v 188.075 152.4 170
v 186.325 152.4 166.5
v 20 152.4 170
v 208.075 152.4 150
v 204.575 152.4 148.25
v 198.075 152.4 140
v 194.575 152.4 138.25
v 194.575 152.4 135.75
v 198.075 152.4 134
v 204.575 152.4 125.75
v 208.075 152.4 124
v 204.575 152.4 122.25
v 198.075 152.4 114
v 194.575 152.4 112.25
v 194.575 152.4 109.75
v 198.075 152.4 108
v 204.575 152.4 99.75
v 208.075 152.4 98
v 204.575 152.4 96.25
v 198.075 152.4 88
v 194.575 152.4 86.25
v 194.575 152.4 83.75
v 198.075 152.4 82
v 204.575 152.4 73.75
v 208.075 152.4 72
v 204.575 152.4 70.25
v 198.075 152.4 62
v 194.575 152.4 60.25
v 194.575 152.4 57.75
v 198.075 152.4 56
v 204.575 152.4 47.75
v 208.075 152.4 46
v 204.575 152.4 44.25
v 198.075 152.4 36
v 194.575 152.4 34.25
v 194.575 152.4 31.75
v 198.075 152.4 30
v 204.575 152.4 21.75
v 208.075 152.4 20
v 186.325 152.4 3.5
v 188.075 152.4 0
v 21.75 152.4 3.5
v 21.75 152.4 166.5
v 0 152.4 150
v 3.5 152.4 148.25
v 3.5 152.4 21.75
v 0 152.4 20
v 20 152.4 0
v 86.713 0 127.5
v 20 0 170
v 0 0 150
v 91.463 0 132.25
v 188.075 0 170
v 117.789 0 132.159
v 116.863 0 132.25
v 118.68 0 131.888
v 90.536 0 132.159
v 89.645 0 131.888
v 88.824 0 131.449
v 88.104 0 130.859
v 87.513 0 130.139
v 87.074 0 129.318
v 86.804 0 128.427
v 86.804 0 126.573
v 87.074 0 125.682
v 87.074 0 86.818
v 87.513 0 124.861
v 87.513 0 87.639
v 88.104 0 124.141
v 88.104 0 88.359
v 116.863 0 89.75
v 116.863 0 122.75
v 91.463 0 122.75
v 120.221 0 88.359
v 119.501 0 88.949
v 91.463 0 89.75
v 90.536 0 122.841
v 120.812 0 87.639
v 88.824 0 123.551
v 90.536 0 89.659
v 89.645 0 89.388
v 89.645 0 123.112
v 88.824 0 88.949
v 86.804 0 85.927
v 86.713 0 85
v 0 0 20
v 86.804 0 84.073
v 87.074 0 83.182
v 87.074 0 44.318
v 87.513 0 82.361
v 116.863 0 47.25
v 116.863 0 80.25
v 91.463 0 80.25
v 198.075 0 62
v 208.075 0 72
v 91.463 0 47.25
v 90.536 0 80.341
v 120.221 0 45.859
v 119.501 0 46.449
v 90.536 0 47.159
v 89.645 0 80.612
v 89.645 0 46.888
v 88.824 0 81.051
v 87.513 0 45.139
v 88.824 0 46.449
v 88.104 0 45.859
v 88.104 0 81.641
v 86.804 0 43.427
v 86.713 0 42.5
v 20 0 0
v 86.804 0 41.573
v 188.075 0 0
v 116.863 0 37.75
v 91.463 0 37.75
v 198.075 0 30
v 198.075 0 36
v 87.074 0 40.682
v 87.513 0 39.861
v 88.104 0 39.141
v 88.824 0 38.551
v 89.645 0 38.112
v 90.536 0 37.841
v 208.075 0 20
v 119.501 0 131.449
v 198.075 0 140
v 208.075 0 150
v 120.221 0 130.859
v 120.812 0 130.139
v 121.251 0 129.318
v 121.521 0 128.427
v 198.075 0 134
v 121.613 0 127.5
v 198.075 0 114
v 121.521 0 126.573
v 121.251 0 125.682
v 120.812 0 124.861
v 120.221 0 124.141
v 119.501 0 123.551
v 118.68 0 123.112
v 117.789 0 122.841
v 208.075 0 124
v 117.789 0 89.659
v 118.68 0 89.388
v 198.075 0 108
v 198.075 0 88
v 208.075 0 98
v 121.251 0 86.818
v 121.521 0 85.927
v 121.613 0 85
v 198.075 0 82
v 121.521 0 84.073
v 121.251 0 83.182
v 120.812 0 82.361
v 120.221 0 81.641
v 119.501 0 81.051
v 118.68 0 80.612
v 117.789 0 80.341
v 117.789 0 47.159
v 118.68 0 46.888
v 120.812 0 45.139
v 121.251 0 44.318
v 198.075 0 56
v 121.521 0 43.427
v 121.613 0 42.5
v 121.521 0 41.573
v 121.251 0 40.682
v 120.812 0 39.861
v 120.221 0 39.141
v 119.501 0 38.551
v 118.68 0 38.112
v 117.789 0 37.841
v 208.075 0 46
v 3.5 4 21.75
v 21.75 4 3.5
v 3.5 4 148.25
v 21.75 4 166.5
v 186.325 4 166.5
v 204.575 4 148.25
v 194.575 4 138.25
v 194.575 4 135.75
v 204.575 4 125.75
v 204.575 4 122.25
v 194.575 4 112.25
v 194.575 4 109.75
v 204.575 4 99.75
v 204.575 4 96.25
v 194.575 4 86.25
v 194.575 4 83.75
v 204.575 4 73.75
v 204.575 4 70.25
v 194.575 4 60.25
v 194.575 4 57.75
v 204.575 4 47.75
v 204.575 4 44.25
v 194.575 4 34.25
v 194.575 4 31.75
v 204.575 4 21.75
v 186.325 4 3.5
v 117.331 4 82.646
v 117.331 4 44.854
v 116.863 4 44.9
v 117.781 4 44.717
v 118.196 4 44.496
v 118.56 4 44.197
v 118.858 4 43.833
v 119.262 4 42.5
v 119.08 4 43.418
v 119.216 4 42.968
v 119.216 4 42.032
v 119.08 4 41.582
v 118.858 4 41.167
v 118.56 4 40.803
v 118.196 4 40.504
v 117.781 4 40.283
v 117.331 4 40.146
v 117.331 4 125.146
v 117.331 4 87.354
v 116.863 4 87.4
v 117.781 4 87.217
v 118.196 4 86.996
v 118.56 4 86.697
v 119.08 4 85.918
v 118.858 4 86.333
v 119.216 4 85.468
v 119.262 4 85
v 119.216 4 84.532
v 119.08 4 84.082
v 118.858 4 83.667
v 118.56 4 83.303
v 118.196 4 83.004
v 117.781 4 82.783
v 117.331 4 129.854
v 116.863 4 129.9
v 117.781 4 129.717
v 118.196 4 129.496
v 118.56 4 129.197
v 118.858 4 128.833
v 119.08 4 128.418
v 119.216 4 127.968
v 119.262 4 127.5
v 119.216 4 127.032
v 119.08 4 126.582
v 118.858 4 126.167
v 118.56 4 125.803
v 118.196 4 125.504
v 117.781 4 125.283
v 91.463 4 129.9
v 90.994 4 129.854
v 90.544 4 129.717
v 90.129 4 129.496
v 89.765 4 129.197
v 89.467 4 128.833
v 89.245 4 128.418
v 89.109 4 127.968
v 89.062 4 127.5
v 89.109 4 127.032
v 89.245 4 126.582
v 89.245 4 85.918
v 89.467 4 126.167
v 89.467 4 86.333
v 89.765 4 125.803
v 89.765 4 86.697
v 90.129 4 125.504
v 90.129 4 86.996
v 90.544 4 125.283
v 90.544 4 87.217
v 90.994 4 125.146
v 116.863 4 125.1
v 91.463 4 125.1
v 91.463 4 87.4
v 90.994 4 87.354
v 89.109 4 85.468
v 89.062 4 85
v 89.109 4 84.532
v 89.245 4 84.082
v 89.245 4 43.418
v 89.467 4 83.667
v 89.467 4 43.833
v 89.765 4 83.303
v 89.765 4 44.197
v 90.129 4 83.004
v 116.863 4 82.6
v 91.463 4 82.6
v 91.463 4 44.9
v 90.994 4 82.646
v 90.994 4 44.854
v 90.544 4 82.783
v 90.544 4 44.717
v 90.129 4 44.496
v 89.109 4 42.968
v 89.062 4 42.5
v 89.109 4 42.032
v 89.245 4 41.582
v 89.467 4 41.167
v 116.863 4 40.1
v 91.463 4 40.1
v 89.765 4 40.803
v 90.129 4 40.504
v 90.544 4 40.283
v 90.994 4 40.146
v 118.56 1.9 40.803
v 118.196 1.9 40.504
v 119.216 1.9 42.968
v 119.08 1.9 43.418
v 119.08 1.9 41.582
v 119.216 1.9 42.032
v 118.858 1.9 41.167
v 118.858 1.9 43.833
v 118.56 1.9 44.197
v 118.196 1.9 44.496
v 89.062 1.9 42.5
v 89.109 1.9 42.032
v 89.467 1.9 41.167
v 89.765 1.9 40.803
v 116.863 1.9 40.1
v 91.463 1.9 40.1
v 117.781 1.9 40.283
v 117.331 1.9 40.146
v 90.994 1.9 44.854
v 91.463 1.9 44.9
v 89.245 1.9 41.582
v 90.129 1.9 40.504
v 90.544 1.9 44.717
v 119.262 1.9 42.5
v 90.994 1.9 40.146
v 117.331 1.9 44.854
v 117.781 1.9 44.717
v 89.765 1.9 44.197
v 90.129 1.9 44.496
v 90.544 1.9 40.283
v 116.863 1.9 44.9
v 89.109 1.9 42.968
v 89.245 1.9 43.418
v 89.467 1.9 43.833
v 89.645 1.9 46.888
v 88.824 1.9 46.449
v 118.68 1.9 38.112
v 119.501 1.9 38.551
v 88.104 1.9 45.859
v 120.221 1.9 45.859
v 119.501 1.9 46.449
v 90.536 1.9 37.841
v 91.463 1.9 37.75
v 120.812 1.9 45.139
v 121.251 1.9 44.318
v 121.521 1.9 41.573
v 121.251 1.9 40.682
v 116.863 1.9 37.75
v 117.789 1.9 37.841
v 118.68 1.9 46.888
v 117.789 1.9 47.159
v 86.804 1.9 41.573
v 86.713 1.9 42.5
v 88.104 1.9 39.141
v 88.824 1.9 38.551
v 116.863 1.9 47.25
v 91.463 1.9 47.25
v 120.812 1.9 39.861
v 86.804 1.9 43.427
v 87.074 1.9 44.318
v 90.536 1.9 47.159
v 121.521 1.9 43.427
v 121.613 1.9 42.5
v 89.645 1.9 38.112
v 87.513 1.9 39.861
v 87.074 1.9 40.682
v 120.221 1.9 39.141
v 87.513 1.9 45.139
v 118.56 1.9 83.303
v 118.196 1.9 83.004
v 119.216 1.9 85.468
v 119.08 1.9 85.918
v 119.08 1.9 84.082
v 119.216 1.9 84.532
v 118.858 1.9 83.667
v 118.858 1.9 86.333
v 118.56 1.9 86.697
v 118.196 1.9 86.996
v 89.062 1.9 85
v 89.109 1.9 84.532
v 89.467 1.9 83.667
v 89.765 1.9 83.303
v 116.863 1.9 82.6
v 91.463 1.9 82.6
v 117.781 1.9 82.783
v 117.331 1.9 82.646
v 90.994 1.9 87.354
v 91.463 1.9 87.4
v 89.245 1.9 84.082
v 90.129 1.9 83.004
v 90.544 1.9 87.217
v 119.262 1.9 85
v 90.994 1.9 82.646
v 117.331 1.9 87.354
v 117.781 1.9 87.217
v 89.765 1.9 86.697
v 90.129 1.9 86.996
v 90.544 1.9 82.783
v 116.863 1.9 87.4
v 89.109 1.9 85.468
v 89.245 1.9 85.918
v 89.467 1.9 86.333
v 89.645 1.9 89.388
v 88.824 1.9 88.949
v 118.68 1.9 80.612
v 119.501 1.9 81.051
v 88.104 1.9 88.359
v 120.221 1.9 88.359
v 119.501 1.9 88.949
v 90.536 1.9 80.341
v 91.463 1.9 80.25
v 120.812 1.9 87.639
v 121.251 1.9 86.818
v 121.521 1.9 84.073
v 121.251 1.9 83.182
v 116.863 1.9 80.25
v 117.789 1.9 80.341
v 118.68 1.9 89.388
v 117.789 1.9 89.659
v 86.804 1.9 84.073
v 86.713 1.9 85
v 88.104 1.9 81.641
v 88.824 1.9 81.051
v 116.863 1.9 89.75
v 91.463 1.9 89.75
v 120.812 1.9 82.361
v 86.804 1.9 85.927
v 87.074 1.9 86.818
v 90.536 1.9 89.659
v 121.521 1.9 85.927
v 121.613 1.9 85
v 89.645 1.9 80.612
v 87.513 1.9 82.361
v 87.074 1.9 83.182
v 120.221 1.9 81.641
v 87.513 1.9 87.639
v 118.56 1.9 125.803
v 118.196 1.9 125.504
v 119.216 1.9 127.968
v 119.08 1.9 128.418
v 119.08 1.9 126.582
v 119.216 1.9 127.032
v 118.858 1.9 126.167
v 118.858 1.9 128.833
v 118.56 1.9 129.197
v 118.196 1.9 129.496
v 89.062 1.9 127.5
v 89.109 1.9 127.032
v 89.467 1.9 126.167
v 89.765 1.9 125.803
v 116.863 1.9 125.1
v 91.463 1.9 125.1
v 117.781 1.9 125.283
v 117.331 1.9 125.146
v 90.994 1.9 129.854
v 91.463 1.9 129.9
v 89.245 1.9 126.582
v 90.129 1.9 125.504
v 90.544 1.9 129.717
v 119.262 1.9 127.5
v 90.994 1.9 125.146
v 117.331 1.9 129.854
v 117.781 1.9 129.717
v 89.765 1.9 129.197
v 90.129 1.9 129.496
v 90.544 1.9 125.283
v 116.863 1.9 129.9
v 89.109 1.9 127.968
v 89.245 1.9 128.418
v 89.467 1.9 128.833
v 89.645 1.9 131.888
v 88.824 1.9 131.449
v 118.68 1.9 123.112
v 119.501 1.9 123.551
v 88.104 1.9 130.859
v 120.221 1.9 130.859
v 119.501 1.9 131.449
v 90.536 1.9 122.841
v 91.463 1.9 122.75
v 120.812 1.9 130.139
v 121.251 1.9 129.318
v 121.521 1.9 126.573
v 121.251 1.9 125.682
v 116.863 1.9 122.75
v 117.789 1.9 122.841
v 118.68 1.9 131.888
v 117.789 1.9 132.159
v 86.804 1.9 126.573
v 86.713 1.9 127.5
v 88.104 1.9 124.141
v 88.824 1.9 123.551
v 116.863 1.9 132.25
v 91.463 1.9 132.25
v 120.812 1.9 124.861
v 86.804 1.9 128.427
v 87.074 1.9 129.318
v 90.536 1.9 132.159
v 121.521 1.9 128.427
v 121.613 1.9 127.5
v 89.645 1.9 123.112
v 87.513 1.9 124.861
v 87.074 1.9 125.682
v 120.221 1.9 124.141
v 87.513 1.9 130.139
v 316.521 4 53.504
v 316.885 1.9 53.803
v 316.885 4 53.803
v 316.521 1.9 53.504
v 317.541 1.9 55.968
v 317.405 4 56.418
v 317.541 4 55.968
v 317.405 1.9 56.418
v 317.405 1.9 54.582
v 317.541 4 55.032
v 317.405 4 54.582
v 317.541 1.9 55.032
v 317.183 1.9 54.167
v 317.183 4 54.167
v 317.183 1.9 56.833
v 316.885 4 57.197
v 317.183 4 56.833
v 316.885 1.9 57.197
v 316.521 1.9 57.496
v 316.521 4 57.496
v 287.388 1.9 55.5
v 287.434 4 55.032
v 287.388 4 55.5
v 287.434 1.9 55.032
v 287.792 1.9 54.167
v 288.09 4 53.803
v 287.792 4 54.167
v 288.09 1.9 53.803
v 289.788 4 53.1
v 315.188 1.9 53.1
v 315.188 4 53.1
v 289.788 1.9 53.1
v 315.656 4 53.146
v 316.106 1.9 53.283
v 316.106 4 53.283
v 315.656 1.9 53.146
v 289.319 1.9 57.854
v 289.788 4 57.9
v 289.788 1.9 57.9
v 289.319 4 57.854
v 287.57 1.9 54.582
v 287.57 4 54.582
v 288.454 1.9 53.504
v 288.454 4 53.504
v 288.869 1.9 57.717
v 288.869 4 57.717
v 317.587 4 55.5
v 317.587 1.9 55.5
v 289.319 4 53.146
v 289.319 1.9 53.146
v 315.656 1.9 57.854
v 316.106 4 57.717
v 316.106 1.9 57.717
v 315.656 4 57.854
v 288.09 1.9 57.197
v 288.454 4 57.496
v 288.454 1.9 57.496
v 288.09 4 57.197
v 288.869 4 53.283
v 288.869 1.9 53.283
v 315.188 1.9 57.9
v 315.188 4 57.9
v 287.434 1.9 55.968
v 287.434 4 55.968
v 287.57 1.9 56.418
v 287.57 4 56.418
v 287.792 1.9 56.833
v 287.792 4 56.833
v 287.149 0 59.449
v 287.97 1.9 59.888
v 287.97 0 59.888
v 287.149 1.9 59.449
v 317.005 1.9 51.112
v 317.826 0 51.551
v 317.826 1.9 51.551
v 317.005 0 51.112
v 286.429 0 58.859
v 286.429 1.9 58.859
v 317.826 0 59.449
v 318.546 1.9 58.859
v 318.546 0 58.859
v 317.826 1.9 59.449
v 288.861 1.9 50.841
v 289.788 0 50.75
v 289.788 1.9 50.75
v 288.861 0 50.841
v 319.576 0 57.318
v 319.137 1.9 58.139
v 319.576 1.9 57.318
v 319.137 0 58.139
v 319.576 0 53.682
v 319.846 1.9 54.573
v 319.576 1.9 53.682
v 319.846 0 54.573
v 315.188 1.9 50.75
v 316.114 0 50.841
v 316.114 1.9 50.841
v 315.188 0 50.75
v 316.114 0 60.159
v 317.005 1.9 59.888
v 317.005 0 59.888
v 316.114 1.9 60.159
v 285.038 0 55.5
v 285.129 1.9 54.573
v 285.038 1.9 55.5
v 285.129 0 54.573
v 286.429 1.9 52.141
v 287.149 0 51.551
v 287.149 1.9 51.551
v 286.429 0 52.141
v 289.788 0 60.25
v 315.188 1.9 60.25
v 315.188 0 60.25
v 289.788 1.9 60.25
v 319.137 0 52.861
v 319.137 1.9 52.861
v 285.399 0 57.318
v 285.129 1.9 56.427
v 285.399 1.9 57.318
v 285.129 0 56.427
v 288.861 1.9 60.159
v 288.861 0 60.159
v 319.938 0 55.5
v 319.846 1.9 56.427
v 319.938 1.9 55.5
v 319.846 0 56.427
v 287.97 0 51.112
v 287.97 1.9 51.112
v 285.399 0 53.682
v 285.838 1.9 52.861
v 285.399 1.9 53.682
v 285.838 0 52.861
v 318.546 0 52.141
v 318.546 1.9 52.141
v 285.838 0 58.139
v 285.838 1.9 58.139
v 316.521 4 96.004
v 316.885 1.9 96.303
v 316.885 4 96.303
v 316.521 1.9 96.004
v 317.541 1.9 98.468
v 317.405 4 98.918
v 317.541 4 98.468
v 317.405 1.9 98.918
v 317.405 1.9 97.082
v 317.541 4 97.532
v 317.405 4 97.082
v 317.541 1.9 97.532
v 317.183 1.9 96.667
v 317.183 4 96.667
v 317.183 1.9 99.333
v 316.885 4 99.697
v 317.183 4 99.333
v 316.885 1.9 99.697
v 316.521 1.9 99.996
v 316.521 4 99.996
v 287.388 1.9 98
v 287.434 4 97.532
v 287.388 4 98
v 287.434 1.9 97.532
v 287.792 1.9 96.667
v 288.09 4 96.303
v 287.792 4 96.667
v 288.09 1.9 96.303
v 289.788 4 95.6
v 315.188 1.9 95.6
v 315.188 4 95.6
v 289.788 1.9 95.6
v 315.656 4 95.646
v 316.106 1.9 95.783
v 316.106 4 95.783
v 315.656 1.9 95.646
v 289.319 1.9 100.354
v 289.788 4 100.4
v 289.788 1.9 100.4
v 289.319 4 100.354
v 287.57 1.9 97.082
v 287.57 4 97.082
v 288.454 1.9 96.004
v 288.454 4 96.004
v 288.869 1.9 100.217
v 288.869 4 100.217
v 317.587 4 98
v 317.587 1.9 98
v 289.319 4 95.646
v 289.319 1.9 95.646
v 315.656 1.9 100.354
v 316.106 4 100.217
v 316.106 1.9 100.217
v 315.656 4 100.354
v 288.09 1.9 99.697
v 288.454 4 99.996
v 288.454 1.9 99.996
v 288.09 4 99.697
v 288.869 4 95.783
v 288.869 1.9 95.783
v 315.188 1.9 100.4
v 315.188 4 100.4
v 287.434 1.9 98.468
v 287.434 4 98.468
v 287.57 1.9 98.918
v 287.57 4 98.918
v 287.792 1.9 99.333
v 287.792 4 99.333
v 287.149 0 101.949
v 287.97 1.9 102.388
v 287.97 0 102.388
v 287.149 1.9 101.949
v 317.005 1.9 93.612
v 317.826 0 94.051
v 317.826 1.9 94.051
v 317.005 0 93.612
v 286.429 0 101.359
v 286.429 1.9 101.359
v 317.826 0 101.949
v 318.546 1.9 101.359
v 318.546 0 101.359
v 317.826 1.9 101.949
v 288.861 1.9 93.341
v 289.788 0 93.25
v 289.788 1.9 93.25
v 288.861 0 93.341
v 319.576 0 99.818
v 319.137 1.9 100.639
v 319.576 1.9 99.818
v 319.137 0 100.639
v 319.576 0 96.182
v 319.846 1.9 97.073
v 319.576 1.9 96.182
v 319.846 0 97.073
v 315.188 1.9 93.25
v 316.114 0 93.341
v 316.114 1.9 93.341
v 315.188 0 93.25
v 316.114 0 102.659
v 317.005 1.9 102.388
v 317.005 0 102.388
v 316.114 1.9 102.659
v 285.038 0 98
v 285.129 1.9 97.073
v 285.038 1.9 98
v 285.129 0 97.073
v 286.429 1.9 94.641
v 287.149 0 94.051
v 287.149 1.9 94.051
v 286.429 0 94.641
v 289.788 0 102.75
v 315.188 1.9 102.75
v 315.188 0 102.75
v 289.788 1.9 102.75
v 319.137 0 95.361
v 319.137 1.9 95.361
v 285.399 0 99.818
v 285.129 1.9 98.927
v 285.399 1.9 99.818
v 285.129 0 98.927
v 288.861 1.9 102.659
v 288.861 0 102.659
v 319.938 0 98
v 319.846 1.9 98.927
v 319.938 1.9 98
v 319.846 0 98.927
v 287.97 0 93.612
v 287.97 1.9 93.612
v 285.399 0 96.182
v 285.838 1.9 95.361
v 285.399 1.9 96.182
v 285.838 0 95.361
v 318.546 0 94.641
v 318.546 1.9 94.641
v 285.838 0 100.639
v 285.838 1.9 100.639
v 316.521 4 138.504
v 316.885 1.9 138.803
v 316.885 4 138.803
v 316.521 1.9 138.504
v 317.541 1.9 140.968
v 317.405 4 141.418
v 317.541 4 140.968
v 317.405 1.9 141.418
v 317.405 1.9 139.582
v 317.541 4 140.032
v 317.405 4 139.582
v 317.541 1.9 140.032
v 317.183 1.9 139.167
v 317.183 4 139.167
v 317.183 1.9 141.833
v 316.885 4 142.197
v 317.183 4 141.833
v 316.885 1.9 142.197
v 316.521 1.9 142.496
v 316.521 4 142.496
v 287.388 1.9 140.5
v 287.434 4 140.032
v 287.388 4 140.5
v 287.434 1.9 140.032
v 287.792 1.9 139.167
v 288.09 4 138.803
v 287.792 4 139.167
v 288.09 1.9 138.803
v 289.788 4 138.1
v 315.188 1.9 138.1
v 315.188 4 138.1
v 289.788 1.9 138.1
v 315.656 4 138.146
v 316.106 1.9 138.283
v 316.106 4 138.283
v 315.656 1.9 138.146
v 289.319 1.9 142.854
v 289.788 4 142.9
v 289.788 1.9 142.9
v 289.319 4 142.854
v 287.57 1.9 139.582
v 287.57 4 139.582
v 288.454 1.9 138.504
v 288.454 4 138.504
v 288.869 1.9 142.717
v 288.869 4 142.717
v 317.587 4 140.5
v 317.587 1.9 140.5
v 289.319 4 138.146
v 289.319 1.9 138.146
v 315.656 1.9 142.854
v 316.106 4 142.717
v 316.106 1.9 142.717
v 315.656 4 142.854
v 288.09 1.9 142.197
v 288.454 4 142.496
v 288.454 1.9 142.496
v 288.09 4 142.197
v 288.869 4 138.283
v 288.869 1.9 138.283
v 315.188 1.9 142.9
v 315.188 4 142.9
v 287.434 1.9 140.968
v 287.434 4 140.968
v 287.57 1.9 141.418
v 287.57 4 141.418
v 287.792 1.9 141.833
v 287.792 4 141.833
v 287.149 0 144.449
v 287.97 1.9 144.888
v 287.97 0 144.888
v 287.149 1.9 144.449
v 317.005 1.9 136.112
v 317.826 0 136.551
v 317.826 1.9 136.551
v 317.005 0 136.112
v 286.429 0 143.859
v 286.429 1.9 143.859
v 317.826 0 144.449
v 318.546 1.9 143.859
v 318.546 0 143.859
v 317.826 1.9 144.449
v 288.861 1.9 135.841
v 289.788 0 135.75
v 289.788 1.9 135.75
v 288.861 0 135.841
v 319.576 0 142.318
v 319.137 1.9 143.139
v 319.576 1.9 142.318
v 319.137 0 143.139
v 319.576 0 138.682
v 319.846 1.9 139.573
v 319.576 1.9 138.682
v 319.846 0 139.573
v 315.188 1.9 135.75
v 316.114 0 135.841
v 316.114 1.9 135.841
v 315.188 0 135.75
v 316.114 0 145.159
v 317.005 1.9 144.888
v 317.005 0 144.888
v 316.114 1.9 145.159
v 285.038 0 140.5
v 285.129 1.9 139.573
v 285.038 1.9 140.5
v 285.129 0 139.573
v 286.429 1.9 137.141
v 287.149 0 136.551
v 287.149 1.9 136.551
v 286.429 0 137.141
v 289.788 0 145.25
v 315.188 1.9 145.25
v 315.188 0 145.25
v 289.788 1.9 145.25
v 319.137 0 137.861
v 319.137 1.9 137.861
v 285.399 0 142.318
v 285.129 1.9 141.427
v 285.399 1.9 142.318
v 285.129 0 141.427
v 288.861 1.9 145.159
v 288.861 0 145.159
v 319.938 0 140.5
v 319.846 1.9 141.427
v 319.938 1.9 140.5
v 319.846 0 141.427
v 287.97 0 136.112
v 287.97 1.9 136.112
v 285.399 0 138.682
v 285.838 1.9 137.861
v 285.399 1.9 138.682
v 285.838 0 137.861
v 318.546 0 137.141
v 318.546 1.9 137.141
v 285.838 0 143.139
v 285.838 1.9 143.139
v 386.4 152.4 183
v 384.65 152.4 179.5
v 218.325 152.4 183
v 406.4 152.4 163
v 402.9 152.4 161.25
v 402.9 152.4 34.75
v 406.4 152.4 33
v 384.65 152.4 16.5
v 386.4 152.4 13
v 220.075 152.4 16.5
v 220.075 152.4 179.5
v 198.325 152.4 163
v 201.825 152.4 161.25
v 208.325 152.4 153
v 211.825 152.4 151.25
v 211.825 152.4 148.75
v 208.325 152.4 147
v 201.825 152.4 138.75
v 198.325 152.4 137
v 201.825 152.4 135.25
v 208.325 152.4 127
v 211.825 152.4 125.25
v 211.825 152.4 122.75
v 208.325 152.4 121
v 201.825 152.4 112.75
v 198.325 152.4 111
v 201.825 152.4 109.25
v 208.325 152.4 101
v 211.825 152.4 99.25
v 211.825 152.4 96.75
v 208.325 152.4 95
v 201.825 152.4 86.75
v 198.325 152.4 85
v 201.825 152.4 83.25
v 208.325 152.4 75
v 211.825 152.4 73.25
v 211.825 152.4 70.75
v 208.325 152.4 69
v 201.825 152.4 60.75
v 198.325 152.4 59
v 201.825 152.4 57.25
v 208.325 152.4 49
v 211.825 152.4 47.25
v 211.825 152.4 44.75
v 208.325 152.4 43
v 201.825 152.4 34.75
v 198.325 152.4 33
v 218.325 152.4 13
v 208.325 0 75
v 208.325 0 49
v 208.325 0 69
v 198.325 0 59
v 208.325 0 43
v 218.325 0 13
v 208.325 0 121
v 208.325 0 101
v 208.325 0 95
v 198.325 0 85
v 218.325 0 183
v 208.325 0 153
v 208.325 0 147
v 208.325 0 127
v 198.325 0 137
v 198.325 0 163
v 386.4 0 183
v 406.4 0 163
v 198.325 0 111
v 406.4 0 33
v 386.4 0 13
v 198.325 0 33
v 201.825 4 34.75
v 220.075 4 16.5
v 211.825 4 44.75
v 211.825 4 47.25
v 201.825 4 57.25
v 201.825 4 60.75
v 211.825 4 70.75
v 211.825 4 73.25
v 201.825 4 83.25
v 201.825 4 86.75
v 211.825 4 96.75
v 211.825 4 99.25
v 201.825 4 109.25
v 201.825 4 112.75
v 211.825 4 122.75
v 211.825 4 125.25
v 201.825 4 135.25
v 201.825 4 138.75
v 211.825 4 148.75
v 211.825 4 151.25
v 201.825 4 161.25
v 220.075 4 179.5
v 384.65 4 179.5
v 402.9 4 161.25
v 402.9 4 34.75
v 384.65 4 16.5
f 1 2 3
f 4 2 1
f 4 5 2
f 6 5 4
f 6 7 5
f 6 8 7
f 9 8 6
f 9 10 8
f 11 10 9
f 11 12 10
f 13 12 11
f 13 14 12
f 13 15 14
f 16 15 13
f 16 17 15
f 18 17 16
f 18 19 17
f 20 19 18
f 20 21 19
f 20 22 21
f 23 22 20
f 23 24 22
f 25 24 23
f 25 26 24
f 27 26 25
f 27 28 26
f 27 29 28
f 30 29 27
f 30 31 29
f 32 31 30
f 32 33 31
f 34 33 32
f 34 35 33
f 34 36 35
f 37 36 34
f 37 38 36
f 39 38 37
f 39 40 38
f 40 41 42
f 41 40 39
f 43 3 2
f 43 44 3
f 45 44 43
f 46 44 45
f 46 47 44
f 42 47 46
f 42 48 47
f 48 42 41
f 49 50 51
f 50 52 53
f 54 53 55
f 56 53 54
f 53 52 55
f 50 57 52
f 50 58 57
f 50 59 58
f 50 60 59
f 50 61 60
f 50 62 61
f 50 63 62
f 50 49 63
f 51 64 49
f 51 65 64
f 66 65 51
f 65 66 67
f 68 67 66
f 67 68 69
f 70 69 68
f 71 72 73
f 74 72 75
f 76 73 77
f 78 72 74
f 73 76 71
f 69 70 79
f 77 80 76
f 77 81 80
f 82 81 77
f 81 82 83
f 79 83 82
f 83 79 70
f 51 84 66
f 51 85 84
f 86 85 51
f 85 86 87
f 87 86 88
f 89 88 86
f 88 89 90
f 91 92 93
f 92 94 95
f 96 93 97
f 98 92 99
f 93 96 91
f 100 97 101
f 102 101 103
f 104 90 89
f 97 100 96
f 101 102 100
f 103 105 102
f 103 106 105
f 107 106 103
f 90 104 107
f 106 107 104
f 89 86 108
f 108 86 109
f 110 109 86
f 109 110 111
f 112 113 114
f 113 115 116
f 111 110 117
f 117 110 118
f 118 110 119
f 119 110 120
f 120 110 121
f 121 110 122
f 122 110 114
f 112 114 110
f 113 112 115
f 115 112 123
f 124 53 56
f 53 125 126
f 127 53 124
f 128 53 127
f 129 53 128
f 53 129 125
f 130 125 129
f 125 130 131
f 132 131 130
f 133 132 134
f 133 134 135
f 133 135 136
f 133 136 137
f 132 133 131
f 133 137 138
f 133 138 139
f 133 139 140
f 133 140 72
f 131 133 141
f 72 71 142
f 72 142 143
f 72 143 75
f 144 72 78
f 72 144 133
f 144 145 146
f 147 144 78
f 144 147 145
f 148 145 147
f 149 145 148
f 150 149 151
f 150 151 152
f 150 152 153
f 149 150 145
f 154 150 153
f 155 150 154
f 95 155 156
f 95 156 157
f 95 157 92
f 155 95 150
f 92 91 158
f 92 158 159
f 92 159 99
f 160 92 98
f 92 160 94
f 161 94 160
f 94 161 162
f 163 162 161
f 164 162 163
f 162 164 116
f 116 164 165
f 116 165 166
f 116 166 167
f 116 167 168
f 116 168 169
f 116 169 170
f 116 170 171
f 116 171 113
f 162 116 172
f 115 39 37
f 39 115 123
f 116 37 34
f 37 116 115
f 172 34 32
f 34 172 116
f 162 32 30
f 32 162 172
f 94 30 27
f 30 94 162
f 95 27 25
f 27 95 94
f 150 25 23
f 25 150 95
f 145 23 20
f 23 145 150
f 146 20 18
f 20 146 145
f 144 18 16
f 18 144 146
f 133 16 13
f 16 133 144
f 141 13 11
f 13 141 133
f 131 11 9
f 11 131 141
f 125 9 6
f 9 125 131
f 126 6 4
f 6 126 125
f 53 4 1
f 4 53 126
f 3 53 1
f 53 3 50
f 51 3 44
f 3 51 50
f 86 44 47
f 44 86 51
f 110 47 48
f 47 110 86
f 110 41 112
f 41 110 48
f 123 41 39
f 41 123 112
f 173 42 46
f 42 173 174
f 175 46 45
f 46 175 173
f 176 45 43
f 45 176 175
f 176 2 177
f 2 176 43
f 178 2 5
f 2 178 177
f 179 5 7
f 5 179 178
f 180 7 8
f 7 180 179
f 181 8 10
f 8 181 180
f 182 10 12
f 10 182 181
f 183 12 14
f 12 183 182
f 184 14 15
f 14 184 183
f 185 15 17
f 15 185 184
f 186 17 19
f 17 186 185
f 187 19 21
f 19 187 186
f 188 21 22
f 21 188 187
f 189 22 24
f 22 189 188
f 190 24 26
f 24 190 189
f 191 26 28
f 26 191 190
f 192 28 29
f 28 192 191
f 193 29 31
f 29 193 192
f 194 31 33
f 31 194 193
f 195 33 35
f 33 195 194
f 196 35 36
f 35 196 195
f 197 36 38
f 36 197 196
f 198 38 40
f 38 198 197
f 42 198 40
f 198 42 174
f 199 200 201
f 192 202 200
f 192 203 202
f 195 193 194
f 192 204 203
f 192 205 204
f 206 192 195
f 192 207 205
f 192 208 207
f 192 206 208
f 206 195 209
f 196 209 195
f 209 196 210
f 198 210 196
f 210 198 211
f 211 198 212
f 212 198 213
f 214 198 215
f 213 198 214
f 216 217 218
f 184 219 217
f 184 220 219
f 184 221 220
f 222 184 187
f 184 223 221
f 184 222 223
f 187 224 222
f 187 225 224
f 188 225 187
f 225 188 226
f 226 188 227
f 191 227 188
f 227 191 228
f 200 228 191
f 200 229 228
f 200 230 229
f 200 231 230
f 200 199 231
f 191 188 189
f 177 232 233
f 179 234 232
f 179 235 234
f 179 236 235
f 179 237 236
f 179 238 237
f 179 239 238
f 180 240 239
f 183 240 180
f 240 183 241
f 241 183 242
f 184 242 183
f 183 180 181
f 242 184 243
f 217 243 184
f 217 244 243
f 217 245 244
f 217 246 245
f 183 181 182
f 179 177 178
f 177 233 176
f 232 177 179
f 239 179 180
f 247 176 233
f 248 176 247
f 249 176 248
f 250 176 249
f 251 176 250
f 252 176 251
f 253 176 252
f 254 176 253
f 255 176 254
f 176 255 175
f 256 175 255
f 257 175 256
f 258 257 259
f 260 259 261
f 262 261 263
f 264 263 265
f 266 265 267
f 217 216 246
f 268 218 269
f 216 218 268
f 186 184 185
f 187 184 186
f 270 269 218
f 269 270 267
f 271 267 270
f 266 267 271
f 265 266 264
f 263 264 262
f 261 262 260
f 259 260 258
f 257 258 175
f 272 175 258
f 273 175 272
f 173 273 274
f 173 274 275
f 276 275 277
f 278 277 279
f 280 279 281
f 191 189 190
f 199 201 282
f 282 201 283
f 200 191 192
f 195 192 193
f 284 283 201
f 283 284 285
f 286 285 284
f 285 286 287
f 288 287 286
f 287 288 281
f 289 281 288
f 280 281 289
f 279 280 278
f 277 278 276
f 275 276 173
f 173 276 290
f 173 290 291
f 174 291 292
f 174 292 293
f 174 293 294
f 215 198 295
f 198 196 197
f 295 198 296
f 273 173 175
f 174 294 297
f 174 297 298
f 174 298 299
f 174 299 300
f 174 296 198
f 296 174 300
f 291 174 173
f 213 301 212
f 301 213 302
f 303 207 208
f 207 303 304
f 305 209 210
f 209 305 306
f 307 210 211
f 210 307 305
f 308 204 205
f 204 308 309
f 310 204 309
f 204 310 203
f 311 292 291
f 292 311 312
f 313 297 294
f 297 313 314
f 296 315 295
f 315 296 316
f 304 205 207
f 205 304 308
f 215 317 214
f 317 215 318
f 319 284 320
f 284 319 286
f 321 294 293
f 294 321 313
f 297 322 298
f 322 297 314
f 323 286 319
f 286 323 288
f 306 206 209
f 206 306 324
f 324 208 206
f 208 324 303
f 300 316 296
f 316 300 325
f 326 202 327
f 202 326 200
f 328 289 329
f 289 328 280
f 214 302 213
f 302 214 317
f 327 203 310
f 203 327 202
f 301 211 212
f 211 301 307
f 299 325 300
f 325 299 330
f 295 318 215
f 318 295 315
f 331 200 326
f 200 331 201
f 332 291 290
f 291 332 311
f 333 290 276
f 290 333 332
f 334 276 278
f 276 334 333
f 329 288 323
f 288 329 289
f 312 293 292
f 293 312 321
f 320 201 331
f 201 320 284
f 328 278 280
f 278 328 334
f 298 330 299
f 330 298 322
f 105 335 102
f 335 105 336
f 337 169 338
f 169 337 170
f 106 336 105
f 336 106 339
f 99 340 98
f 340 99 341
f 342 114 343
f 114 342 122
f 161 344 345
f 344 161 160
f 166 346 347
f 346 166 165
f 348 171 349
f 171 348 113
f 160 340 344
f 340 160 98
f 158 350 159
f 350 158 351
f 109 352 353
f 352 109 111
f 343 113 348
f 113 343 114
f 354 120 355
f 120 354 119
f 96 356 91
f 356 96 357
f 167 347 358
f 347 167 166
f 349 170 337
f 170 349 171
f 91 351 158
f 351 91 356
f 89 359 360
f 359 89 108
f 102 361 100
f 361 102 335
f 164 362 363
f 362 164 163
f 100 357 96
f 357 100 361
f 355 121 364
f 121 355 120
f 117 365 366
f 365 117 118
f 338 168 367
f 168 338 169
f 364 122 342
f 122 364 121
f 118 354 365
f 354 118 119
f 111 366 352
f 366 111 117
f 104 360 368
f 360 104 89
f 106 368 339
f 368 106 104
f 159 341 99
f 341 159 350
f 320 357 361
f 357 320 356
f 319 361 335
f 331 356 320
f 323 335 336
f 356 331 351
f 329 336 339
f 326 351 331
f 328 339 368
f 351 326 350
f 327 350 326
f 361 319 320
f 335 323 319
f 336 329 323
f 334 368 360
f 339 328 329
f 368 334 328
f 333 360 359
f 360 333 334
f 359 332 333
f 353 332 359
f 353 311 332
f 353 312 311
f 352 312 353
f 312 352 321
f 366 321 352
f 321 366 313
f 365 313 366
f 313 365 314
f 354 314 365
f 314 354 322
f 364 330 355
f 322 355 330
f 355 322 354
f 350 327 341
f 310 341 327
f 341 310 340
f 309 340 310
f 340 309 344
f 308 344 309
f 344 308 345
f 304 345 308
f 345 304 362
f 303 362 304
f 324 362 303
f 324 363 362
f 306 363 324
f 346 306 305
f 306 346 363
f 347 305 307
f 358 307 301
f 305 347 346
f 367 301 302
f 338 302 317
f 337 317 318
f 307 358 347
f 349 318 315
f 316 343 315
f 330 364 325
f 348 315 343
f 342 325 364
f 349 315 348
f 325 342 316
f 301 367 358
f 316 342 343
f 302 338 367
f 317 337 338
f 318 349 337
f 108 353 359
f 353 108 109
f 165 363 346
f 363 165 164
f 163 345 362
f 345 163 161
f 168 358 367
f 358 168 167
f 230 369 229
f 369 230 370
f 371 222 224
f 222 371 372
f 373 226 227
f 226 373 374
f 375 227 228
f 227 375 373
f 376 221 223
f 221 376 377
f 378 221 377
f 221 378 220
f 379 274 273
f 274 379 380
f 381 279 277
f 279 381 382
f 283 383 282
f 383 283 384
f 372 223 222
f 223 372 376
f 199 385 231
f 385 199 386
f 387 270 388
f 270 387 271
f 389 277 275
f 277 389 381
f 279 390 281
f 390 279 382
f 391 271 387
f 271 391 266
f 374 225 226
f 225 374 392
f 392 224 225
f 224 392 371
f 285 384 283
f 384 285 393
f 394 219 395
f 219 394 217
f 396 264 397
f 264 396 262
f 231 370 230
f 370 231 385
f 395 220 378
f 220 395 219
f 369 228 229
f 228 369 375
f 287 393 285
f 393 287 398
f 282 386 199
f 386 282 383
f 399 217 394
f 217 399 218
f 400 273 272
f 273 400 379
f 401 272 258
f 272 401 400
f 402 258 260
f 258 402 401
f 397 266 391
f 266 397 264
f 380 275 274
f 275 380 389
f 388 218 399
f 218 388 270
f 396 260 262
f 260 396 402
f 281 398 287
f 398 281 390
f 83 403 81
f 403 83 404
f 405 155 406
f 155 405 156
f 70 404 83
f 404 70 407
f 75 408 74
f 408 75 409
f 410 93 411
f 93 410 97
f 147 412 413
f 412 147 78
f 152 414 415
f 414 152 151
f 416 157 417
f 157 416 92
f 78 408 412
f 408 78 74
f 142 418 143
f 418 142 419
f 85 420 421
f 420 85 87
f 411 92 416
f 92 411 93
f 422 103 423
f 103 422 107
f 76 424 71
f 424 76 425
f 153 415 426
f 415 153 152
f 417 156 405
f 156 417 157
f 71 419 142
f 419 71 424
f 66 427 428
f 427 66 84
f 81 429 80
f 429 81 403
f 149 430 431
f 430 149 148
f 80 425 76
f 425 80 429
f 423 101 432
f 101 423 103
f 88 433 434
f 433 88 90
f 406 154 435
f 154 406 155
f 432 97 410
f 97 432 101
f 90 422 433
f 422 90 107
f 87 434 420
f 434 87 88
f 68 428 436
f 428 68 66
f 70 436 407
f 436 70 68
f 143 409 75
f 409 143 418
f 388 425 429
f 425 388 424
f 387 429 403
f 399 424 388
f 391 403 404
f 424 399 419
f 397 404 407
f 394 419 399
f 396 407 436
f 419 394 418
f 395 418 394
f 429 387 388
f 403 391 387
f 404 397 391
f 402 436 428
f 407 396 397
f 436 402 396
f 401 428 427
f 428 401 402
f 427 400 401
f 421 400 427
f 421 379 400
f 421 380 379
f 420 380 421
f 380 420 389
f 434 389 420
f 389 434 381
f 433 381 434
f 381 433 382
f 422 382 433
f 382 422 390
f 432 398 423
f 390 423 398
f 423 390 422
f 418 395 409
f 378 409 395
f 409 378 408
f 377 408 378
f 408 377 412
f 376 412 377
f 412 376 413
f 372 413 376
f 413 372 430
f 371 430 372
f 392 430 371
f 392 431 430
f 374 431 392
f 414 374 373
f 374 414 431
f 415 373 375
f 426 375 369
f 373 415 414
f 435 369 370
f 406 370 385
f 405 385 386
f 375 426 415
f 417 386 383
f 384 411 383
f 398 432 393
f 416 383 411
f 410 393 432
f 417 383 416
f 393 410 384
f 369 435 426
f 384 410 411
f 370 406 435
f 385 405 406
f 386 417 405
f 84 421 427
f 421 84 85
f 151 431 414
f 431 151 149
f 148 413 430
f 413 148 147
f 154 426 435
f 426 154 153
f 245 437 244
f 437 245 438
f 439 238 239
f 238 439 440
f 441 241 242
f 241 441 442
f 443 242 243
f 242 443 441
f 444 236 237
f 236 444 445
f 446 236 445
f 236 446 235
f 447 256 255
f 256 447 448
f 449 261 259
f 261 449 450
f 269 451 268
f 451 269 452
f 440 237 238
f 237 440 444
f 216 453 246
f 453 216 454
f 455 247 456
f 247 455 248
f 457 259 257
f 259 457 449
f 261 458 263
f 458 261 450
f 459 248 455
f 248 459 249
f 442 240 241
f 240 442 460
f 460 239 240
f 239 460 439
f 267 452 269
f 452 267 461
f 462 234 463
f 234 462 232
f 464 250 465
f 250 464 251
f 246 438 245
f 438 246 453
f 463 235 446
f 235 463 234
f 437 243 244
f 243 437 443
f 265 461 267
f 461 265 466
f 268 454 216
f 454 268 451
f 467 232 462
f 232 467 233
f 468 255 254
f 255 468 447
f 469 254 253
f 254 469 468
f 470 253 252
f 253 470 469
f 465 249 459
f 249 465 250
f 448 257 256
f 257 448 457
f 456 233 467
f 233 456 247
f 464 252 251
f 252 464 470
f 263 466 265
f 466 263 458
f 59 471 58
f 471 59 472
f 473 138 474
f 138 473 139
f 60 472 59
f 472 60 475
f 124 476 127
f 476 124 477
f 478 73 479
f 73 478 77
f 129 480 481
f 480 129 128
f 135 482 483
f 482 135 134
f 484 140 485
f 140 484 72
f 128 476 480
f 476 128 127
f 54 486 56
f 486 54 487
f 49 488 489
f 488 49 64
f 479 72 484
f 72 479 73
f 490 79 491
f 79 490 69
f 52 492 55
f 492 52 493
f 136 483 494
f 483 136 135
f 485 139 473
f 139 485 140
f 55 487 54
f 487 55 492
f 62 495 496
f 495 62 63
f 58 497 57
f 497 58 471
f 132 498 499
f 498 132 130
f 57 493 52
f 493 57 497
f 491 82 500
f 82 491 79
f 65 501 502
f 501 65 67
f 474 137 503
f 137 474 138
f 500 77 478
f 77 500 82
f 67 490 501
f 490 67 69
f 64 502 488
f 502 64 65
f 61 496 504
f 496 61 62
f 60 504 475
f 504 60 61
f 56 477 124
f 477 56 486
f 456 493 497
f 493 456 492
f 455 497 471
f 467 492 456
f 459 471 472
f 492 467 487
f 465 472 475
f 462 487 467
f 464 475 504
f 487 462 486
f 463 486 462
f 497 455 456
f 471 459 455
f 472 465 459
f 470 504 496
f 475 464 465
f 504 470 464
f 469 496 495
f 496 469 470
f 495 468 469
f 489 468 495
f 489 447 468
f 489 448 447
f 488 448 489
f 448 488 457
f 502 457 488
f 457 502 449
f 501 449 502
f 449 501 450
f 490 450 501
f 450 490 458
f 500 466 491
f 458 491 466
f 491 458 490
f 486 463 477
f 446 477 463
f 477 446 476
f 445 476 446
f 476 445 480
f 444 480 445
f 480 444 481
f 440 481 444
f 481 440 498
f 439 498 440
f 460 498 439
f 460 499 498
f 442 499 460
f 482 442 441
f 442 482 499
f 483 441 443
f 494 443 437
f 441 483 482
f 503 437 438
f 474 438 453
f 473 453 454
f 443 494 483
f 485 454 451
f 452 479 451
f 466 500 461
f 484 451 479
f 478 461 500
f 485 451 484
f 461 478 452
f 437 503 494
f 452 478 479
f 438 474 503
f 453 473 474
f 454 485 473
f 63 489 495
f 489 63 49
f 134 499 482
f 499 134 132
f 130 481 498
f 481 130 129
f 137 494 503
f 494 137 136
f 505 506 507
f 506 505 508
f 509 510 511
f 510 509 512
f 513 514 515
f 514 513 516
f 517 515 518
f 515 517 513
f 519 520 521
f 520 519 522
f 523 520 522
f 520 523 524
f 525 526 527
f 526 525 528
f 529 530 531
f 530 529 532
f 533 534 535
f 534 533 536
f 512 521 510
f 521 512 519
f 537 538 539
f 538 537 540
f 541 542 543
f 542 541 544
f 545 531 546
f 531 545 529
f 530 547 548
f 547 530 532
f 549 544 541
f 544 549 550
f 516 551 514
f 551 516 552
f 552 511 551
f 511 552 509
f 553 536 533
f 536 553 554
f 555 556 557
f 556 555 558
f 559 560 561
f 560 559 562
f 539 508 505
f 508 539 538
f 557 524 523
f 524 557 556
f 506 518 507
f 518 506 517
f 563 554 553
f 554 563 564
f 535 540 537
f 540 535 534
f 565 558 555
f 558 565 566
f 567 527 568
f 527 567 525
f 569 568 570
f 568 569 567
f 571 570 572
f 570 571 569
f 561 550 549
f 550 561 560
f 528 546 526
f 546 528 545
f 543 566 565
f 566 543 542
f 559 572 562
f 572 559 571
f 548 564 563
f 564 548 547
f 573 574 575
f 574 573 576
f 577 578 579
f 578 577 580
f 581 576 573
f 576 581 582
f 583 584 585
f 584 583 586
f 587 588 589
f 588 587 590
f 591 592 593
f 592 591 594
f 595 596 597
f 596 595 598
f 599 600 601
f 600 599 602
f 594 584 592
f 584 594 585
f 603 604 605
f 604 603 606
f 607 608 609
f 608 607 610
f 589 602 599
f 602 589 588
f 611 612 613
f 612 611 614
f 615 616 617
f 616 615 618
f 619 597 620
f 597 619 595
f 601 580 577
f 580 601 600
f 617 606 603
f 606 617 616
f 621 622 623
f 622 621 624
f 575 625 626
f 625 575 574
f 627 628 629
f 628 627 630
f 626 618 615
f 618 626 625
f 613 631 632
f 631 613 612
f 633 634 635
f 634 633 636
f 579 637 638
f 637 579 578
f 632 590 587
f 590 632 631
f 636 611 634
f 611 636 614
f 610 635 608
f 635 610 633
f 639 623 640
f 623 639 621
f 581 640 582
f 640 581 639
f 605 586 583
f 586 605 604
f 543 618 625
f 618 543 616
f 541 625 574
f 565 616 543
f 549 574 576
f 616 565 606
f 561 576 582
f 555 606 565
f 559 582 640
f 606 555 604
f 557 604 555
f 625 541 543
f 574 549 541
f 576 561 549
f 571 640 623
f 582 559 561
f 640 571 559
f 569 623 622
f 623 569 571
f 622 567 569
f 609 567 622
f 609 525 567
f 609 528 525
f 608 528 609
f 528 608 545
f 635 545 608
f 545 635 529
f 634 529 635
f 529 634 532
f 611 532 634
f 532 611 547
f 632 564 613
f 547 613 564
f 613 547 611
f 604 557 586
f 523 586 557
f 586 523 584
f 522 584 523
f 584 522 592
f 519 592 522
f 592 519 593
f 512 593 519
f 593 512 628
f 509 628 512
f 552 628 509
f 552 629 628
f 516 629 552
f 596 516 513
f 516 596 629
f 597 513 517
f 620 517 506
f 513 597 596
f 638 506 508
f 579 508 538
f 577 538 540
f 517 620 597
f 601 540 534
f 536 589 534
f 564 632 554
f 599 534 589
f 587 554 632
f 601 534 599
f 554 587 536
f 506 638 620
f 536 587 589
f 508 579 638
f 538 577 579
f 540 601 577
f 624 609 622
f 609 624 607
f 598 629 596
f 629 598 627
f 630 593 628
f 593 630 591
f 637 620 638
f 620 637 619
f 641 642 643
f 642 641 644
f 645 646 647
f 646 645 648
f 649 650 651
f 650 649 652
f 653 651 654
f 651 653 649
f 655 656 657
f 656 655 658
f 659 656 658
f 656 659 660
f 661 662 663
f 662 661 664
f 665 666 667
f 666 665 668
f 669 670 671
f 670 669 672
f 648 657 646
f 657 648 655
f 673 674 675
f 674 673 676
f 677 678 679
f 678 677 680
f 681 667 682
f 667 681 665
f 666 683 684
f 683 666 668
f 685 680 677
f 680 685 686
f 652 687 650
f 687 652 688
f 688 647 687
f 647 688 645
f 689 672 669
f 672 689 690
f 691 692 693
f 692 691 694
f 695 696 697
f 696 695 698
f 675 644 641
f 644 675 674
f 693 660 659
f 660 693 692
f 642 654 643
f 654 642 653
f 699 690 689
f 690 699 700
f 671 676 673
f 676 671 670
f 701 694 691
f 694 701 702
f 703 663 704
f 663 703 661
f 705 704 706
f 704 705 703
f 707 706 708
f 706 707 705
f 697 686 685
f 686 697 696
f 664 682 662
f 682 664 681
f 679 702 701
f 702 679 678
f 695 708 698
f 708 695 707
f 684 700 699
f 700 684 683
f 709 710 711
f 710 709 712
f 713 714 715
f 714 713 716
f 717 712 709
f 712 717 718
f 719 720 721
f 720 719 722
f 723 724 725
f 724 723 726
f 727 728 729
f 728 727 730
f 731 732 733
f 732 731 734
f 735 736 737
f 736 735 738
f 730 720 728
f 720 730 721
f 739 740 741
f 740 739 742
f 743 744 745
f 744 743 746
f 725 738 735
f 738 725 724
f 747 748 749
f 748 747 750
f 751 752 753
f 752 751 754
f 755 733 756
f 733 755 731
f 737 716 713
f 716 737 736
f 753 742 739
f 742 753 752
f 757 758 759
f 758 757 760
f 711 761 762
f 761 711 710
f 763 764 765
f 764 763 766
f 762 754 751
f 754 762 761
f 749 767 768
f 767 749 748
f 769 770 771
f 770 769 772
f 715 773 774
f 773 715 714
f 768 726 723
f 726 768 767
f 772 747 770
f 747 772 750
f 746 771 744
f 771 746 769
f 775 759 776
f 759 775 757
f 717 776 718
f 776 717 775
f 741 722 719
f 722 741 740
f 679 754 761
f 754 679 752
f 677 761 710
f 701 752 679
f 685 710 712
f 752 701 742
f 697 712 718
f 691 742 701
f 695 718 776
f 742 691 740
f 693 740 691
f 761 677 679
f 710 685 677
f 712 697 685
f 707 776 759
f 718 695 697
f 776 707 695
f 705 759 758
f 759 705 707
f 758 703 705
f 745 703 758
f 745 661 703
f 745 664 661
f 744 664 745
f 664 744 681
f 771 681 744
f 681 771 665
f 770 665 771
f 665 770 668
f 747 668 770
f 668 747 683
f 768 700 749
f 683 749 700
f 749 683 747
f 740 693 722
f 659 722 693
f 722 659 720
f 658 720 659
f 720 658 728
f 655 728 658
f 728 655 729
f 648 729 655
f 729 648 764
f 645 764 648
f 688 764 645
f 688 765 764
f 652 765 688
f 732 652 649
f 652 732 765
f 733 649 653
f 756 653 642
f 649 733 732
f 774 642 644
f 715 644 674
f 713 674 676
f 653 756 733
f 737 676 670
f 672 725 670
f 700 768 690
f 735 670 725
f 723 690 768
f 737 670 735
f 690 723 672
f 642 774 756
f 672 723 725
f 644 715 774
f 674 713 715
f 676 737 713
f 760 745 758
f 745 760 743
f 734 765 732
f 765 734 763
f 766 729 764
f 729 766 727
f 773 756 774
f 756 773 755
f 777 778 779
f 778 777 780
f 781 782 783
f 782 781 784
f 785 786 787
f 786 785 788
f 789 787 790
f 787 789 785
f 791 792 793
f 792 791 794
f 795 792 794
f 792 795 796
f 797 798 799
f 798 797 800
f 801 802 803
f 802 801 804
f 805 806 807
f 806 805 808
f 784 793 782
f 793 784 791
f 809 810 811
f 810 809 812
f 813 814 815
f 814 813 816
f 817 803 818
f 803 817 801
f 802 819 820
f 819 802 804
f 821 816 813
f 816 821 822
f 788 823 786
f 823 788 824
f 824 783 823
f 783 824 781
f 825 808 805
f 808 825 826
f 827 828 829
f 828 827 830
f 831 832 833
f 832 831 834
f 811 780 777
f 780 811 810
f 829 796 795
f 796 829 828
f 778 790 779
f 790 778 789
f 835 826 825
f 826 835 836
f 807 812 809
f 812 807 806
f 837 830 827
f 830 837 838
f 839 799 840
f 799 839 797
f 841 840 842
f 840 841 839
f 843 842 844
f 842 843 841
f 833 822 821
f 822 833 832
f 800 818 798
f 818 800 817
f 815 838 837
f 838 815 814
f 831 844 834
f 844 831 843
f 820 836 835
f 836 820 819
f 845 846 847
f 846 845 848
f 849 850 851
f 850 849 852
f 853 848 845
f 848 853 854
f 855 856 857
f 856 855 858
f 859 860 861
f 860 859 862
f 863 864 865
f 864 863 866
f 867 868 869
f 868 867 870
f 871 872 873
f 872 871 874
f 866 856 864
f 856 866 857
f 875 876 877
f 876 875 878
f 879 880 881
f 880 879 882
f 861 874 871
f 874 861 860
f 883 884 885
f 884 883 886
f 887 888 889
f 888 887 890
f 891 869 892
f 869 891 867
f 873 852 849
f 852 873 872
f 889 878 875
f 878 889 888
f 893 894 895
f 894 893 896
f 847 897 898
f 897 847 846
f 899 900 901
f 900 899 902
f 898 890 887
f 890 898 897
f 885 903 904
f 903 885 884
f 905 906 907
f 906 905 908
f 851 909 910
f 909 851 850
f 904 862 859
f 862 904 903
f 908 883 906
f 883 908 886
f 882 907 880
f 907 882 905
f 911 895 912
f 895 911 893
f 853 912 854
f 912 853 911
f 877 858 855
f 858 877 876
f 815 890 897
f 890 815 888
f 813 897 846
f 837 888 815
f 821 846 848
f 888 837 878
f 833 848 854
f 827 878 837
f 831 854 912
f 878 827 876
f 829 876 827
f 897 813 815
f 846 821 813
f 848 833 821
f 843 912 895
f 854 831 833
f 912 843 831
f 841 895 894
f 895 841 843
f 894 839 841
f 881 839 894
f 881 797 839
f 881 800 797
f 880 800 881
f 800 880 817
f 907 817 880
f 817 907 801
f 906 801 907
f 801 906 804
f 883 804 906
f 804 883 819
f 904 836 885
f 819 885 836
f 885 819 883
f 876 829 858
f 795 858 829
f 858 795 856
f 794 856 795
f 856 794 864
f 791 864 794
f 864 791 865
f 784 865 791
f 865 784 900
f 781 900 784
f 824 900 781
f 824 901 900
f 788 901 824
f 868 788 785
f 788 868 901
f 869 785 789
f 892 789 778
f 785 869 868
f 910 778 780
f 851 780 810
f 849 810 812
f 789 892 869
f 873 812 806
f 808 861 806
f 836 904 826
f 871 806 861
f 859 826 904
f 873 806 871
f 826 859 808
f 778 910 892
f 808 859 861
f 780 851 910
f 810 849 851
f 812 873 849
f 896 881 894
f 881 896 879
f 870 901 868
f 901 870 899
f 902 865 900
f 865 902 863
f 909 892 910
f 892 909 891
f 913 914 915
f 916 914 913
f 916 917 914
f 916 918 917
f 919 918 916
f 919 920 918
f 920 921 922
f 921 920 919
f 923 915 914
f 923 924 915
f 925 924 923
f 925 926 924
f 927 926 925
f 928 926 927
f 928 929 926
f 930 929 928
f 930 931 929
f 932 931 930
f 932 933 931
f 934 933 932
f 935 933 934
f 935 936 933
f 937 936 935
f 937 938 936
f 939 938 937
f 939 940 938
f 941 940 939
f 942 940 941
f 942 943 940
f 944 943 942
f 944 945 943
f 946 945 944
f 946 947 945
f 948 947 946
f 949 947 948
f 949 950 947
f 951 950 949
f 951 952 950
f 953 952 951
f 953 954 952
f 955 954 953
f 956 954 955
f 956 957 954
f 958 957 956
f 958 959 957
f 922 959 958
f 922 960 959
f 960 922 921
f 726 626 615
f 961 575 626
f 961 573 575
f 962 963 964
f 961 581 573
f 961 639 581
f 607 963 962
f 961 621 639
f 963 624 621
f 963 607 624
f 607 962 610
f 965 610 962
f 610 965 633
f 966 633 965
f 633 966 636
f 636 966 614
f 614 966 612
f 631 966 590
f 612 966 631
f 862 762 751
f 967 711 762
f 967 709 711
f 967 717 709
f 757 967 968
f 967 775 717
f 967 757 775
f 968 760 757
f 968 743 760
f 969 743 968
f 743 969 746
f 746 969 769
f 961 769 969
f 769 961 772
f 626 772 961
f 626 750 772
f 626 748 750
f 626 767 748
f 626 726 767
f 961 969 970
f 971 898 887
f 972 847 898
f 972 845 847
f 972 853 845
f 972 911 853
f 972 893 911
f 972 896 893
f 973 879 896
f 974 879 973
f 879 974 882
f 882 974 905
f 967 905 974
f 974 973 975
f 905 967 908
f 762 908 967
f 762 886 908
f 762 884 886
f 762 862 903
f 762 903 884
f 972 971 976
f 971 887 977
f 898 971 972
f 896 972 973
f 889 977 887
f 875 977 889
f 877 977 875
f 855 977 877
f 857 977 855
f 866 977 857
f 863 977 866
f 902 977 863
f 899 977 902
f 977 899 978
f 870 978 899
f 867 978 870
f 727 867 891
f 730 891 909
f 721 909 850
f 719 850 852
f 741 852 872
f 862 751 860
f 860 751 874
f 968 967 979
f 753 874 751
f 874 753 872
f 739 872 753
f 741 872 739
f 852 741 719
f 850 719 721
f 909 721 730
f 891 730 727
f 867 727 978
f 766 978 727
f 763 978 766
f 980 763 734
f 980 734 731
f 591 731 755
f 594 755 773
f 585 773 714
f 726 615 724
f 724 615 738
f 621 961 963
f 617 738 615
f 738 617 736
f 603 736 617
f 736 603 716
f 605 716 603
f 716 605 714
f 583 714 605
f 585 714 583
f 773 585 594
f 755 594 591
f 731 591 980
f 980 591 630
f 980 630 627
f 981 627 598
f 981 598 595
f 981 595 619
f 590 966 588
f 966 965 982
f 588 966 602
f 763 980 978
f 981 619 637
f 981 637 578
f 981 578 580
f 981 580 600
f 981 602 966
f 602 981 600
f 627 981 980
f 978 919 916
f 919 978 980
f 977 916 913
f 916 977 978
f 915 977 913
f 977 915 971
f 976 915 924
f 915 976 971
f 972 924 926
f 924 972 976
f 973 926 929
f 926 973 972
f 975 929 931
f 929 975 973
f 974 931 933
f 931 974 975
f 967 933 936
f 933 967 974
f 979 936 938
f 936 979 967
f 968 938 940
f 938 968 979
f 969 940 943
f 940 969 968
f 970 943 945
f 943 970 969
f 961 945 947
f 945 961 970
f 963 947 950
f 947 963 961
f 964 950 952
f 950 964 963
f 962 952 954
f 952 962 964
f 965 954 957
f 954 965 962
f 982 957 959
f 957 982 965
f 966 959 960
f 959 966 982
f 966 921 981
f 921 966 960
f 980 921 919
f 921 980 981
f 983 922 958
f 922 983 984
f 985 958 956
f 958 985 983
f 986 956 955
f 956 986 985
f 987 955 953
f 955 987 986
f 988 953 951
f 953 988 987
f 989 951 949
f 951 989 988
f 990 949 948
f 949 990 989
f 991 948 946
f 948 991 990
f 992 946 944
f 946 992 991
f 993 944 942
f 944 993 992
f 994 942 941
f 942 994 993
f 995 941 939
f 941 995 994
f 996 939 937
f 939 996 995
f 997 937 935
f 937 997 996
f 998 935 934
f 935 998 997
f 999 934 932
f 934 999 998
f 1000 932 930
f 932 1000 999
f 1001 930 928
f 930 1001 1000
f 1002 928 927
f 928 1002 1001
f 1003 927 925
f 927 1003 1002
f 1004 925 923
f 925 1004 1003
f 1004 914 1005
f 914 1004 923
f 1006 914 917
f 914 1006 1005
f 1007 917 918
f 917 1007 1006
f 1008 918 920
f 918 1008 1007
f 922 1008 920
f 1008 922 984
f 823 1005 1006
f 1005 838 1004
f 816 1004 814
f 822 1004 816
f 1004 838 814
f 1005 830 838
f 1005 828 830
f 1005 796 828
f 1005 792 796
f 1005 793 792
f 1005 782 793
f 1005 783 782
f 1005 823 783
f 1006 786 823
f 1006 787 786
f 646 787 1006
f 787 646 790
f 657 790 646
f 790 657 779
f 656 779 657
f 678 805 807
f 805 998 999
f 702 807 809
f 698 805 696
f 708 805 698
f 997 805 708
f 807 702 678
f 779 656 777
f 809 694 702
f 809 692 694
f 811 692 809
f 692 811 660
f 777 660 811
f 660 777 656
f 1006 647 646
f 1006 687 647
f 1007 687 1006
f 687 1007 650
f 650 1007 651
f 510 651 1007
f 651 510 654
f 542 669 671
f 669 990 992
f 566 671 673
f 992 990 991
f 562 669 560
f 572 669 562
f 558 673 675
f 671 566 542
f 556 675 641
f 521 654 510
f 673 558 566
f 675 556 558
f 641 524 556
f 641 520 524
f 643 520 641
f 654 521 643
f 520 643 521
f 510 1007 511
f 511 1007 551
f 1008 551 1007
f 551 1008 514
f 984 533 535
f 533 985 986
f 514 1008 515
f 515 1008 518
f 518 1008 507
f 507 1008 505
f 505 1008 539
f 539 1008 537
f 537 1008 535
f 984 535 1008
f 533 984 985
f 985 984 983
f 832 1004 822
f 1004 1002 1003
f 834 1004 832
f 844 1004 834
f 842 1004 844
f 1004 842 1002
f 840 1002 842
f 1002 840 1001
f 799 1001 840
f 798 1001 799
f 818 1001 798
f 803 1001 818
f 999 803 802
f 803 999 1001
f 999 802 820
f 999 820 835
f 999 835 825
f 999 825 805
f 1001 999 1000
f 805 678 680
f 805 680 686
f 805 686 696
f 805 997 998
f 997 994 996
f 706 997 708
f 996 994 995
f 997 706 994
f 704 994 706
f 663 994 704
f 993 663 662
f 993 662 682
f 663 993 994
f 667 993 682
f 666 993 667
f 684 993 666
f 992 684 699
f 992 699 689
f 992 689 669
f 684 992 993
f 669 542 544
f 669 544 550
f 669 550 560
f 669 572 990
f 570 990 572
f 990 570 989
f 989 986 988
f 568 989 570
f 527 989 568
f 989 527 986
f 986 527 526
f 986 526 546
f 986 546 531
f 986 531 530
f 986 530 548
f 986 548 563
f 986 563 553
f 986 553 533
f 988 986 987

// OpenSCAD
use <single_module.scad>

num_teeth = 5;
tooth_height = 26.0;
tooth_depth = 10.0;
corner_bevel = 20.0;
clearance = 0.25;

span_16in = 16.0 * 25.4; // 406.4 mm
calc_W_in = (span_16in + tooth_depth + clearance) / 2 / 25.4; // ~8.20177 inches

// Render Module 1 (Blue) at X=0, Z=0
color([0.25, 0.55, 0.85])
translate([0, 0, 0])
single_module(
    width_in = calc_W_in,
    depth_in = 6.0,
    n_teeth = num_teeth,
    t_h = tooth_height,
    t_d = tooth_depth,
    bevel = corner_bevel,
    clr = clearance,
    flat_l = true,
    flat_r = false
);

// Render Module 2 (Orange) shifted X = (W_mm - tooth_depth), Z = tooth_height / 2
color([0.90, 0.45, 0.25])
translate([calc_W_in * 25.4 - tooth_depth, 0, tooth_height / 2])
single_module(
    width_in = calc_W_in,
    depth_in = 6.0,
    n_teeth = num_teeth,
    t_h = tooth_height,
    t_d = tooth_depth,
    bevel = corner_bevel,
    clr = clearance,
    flat_l = false,
    flat_r = true
);
